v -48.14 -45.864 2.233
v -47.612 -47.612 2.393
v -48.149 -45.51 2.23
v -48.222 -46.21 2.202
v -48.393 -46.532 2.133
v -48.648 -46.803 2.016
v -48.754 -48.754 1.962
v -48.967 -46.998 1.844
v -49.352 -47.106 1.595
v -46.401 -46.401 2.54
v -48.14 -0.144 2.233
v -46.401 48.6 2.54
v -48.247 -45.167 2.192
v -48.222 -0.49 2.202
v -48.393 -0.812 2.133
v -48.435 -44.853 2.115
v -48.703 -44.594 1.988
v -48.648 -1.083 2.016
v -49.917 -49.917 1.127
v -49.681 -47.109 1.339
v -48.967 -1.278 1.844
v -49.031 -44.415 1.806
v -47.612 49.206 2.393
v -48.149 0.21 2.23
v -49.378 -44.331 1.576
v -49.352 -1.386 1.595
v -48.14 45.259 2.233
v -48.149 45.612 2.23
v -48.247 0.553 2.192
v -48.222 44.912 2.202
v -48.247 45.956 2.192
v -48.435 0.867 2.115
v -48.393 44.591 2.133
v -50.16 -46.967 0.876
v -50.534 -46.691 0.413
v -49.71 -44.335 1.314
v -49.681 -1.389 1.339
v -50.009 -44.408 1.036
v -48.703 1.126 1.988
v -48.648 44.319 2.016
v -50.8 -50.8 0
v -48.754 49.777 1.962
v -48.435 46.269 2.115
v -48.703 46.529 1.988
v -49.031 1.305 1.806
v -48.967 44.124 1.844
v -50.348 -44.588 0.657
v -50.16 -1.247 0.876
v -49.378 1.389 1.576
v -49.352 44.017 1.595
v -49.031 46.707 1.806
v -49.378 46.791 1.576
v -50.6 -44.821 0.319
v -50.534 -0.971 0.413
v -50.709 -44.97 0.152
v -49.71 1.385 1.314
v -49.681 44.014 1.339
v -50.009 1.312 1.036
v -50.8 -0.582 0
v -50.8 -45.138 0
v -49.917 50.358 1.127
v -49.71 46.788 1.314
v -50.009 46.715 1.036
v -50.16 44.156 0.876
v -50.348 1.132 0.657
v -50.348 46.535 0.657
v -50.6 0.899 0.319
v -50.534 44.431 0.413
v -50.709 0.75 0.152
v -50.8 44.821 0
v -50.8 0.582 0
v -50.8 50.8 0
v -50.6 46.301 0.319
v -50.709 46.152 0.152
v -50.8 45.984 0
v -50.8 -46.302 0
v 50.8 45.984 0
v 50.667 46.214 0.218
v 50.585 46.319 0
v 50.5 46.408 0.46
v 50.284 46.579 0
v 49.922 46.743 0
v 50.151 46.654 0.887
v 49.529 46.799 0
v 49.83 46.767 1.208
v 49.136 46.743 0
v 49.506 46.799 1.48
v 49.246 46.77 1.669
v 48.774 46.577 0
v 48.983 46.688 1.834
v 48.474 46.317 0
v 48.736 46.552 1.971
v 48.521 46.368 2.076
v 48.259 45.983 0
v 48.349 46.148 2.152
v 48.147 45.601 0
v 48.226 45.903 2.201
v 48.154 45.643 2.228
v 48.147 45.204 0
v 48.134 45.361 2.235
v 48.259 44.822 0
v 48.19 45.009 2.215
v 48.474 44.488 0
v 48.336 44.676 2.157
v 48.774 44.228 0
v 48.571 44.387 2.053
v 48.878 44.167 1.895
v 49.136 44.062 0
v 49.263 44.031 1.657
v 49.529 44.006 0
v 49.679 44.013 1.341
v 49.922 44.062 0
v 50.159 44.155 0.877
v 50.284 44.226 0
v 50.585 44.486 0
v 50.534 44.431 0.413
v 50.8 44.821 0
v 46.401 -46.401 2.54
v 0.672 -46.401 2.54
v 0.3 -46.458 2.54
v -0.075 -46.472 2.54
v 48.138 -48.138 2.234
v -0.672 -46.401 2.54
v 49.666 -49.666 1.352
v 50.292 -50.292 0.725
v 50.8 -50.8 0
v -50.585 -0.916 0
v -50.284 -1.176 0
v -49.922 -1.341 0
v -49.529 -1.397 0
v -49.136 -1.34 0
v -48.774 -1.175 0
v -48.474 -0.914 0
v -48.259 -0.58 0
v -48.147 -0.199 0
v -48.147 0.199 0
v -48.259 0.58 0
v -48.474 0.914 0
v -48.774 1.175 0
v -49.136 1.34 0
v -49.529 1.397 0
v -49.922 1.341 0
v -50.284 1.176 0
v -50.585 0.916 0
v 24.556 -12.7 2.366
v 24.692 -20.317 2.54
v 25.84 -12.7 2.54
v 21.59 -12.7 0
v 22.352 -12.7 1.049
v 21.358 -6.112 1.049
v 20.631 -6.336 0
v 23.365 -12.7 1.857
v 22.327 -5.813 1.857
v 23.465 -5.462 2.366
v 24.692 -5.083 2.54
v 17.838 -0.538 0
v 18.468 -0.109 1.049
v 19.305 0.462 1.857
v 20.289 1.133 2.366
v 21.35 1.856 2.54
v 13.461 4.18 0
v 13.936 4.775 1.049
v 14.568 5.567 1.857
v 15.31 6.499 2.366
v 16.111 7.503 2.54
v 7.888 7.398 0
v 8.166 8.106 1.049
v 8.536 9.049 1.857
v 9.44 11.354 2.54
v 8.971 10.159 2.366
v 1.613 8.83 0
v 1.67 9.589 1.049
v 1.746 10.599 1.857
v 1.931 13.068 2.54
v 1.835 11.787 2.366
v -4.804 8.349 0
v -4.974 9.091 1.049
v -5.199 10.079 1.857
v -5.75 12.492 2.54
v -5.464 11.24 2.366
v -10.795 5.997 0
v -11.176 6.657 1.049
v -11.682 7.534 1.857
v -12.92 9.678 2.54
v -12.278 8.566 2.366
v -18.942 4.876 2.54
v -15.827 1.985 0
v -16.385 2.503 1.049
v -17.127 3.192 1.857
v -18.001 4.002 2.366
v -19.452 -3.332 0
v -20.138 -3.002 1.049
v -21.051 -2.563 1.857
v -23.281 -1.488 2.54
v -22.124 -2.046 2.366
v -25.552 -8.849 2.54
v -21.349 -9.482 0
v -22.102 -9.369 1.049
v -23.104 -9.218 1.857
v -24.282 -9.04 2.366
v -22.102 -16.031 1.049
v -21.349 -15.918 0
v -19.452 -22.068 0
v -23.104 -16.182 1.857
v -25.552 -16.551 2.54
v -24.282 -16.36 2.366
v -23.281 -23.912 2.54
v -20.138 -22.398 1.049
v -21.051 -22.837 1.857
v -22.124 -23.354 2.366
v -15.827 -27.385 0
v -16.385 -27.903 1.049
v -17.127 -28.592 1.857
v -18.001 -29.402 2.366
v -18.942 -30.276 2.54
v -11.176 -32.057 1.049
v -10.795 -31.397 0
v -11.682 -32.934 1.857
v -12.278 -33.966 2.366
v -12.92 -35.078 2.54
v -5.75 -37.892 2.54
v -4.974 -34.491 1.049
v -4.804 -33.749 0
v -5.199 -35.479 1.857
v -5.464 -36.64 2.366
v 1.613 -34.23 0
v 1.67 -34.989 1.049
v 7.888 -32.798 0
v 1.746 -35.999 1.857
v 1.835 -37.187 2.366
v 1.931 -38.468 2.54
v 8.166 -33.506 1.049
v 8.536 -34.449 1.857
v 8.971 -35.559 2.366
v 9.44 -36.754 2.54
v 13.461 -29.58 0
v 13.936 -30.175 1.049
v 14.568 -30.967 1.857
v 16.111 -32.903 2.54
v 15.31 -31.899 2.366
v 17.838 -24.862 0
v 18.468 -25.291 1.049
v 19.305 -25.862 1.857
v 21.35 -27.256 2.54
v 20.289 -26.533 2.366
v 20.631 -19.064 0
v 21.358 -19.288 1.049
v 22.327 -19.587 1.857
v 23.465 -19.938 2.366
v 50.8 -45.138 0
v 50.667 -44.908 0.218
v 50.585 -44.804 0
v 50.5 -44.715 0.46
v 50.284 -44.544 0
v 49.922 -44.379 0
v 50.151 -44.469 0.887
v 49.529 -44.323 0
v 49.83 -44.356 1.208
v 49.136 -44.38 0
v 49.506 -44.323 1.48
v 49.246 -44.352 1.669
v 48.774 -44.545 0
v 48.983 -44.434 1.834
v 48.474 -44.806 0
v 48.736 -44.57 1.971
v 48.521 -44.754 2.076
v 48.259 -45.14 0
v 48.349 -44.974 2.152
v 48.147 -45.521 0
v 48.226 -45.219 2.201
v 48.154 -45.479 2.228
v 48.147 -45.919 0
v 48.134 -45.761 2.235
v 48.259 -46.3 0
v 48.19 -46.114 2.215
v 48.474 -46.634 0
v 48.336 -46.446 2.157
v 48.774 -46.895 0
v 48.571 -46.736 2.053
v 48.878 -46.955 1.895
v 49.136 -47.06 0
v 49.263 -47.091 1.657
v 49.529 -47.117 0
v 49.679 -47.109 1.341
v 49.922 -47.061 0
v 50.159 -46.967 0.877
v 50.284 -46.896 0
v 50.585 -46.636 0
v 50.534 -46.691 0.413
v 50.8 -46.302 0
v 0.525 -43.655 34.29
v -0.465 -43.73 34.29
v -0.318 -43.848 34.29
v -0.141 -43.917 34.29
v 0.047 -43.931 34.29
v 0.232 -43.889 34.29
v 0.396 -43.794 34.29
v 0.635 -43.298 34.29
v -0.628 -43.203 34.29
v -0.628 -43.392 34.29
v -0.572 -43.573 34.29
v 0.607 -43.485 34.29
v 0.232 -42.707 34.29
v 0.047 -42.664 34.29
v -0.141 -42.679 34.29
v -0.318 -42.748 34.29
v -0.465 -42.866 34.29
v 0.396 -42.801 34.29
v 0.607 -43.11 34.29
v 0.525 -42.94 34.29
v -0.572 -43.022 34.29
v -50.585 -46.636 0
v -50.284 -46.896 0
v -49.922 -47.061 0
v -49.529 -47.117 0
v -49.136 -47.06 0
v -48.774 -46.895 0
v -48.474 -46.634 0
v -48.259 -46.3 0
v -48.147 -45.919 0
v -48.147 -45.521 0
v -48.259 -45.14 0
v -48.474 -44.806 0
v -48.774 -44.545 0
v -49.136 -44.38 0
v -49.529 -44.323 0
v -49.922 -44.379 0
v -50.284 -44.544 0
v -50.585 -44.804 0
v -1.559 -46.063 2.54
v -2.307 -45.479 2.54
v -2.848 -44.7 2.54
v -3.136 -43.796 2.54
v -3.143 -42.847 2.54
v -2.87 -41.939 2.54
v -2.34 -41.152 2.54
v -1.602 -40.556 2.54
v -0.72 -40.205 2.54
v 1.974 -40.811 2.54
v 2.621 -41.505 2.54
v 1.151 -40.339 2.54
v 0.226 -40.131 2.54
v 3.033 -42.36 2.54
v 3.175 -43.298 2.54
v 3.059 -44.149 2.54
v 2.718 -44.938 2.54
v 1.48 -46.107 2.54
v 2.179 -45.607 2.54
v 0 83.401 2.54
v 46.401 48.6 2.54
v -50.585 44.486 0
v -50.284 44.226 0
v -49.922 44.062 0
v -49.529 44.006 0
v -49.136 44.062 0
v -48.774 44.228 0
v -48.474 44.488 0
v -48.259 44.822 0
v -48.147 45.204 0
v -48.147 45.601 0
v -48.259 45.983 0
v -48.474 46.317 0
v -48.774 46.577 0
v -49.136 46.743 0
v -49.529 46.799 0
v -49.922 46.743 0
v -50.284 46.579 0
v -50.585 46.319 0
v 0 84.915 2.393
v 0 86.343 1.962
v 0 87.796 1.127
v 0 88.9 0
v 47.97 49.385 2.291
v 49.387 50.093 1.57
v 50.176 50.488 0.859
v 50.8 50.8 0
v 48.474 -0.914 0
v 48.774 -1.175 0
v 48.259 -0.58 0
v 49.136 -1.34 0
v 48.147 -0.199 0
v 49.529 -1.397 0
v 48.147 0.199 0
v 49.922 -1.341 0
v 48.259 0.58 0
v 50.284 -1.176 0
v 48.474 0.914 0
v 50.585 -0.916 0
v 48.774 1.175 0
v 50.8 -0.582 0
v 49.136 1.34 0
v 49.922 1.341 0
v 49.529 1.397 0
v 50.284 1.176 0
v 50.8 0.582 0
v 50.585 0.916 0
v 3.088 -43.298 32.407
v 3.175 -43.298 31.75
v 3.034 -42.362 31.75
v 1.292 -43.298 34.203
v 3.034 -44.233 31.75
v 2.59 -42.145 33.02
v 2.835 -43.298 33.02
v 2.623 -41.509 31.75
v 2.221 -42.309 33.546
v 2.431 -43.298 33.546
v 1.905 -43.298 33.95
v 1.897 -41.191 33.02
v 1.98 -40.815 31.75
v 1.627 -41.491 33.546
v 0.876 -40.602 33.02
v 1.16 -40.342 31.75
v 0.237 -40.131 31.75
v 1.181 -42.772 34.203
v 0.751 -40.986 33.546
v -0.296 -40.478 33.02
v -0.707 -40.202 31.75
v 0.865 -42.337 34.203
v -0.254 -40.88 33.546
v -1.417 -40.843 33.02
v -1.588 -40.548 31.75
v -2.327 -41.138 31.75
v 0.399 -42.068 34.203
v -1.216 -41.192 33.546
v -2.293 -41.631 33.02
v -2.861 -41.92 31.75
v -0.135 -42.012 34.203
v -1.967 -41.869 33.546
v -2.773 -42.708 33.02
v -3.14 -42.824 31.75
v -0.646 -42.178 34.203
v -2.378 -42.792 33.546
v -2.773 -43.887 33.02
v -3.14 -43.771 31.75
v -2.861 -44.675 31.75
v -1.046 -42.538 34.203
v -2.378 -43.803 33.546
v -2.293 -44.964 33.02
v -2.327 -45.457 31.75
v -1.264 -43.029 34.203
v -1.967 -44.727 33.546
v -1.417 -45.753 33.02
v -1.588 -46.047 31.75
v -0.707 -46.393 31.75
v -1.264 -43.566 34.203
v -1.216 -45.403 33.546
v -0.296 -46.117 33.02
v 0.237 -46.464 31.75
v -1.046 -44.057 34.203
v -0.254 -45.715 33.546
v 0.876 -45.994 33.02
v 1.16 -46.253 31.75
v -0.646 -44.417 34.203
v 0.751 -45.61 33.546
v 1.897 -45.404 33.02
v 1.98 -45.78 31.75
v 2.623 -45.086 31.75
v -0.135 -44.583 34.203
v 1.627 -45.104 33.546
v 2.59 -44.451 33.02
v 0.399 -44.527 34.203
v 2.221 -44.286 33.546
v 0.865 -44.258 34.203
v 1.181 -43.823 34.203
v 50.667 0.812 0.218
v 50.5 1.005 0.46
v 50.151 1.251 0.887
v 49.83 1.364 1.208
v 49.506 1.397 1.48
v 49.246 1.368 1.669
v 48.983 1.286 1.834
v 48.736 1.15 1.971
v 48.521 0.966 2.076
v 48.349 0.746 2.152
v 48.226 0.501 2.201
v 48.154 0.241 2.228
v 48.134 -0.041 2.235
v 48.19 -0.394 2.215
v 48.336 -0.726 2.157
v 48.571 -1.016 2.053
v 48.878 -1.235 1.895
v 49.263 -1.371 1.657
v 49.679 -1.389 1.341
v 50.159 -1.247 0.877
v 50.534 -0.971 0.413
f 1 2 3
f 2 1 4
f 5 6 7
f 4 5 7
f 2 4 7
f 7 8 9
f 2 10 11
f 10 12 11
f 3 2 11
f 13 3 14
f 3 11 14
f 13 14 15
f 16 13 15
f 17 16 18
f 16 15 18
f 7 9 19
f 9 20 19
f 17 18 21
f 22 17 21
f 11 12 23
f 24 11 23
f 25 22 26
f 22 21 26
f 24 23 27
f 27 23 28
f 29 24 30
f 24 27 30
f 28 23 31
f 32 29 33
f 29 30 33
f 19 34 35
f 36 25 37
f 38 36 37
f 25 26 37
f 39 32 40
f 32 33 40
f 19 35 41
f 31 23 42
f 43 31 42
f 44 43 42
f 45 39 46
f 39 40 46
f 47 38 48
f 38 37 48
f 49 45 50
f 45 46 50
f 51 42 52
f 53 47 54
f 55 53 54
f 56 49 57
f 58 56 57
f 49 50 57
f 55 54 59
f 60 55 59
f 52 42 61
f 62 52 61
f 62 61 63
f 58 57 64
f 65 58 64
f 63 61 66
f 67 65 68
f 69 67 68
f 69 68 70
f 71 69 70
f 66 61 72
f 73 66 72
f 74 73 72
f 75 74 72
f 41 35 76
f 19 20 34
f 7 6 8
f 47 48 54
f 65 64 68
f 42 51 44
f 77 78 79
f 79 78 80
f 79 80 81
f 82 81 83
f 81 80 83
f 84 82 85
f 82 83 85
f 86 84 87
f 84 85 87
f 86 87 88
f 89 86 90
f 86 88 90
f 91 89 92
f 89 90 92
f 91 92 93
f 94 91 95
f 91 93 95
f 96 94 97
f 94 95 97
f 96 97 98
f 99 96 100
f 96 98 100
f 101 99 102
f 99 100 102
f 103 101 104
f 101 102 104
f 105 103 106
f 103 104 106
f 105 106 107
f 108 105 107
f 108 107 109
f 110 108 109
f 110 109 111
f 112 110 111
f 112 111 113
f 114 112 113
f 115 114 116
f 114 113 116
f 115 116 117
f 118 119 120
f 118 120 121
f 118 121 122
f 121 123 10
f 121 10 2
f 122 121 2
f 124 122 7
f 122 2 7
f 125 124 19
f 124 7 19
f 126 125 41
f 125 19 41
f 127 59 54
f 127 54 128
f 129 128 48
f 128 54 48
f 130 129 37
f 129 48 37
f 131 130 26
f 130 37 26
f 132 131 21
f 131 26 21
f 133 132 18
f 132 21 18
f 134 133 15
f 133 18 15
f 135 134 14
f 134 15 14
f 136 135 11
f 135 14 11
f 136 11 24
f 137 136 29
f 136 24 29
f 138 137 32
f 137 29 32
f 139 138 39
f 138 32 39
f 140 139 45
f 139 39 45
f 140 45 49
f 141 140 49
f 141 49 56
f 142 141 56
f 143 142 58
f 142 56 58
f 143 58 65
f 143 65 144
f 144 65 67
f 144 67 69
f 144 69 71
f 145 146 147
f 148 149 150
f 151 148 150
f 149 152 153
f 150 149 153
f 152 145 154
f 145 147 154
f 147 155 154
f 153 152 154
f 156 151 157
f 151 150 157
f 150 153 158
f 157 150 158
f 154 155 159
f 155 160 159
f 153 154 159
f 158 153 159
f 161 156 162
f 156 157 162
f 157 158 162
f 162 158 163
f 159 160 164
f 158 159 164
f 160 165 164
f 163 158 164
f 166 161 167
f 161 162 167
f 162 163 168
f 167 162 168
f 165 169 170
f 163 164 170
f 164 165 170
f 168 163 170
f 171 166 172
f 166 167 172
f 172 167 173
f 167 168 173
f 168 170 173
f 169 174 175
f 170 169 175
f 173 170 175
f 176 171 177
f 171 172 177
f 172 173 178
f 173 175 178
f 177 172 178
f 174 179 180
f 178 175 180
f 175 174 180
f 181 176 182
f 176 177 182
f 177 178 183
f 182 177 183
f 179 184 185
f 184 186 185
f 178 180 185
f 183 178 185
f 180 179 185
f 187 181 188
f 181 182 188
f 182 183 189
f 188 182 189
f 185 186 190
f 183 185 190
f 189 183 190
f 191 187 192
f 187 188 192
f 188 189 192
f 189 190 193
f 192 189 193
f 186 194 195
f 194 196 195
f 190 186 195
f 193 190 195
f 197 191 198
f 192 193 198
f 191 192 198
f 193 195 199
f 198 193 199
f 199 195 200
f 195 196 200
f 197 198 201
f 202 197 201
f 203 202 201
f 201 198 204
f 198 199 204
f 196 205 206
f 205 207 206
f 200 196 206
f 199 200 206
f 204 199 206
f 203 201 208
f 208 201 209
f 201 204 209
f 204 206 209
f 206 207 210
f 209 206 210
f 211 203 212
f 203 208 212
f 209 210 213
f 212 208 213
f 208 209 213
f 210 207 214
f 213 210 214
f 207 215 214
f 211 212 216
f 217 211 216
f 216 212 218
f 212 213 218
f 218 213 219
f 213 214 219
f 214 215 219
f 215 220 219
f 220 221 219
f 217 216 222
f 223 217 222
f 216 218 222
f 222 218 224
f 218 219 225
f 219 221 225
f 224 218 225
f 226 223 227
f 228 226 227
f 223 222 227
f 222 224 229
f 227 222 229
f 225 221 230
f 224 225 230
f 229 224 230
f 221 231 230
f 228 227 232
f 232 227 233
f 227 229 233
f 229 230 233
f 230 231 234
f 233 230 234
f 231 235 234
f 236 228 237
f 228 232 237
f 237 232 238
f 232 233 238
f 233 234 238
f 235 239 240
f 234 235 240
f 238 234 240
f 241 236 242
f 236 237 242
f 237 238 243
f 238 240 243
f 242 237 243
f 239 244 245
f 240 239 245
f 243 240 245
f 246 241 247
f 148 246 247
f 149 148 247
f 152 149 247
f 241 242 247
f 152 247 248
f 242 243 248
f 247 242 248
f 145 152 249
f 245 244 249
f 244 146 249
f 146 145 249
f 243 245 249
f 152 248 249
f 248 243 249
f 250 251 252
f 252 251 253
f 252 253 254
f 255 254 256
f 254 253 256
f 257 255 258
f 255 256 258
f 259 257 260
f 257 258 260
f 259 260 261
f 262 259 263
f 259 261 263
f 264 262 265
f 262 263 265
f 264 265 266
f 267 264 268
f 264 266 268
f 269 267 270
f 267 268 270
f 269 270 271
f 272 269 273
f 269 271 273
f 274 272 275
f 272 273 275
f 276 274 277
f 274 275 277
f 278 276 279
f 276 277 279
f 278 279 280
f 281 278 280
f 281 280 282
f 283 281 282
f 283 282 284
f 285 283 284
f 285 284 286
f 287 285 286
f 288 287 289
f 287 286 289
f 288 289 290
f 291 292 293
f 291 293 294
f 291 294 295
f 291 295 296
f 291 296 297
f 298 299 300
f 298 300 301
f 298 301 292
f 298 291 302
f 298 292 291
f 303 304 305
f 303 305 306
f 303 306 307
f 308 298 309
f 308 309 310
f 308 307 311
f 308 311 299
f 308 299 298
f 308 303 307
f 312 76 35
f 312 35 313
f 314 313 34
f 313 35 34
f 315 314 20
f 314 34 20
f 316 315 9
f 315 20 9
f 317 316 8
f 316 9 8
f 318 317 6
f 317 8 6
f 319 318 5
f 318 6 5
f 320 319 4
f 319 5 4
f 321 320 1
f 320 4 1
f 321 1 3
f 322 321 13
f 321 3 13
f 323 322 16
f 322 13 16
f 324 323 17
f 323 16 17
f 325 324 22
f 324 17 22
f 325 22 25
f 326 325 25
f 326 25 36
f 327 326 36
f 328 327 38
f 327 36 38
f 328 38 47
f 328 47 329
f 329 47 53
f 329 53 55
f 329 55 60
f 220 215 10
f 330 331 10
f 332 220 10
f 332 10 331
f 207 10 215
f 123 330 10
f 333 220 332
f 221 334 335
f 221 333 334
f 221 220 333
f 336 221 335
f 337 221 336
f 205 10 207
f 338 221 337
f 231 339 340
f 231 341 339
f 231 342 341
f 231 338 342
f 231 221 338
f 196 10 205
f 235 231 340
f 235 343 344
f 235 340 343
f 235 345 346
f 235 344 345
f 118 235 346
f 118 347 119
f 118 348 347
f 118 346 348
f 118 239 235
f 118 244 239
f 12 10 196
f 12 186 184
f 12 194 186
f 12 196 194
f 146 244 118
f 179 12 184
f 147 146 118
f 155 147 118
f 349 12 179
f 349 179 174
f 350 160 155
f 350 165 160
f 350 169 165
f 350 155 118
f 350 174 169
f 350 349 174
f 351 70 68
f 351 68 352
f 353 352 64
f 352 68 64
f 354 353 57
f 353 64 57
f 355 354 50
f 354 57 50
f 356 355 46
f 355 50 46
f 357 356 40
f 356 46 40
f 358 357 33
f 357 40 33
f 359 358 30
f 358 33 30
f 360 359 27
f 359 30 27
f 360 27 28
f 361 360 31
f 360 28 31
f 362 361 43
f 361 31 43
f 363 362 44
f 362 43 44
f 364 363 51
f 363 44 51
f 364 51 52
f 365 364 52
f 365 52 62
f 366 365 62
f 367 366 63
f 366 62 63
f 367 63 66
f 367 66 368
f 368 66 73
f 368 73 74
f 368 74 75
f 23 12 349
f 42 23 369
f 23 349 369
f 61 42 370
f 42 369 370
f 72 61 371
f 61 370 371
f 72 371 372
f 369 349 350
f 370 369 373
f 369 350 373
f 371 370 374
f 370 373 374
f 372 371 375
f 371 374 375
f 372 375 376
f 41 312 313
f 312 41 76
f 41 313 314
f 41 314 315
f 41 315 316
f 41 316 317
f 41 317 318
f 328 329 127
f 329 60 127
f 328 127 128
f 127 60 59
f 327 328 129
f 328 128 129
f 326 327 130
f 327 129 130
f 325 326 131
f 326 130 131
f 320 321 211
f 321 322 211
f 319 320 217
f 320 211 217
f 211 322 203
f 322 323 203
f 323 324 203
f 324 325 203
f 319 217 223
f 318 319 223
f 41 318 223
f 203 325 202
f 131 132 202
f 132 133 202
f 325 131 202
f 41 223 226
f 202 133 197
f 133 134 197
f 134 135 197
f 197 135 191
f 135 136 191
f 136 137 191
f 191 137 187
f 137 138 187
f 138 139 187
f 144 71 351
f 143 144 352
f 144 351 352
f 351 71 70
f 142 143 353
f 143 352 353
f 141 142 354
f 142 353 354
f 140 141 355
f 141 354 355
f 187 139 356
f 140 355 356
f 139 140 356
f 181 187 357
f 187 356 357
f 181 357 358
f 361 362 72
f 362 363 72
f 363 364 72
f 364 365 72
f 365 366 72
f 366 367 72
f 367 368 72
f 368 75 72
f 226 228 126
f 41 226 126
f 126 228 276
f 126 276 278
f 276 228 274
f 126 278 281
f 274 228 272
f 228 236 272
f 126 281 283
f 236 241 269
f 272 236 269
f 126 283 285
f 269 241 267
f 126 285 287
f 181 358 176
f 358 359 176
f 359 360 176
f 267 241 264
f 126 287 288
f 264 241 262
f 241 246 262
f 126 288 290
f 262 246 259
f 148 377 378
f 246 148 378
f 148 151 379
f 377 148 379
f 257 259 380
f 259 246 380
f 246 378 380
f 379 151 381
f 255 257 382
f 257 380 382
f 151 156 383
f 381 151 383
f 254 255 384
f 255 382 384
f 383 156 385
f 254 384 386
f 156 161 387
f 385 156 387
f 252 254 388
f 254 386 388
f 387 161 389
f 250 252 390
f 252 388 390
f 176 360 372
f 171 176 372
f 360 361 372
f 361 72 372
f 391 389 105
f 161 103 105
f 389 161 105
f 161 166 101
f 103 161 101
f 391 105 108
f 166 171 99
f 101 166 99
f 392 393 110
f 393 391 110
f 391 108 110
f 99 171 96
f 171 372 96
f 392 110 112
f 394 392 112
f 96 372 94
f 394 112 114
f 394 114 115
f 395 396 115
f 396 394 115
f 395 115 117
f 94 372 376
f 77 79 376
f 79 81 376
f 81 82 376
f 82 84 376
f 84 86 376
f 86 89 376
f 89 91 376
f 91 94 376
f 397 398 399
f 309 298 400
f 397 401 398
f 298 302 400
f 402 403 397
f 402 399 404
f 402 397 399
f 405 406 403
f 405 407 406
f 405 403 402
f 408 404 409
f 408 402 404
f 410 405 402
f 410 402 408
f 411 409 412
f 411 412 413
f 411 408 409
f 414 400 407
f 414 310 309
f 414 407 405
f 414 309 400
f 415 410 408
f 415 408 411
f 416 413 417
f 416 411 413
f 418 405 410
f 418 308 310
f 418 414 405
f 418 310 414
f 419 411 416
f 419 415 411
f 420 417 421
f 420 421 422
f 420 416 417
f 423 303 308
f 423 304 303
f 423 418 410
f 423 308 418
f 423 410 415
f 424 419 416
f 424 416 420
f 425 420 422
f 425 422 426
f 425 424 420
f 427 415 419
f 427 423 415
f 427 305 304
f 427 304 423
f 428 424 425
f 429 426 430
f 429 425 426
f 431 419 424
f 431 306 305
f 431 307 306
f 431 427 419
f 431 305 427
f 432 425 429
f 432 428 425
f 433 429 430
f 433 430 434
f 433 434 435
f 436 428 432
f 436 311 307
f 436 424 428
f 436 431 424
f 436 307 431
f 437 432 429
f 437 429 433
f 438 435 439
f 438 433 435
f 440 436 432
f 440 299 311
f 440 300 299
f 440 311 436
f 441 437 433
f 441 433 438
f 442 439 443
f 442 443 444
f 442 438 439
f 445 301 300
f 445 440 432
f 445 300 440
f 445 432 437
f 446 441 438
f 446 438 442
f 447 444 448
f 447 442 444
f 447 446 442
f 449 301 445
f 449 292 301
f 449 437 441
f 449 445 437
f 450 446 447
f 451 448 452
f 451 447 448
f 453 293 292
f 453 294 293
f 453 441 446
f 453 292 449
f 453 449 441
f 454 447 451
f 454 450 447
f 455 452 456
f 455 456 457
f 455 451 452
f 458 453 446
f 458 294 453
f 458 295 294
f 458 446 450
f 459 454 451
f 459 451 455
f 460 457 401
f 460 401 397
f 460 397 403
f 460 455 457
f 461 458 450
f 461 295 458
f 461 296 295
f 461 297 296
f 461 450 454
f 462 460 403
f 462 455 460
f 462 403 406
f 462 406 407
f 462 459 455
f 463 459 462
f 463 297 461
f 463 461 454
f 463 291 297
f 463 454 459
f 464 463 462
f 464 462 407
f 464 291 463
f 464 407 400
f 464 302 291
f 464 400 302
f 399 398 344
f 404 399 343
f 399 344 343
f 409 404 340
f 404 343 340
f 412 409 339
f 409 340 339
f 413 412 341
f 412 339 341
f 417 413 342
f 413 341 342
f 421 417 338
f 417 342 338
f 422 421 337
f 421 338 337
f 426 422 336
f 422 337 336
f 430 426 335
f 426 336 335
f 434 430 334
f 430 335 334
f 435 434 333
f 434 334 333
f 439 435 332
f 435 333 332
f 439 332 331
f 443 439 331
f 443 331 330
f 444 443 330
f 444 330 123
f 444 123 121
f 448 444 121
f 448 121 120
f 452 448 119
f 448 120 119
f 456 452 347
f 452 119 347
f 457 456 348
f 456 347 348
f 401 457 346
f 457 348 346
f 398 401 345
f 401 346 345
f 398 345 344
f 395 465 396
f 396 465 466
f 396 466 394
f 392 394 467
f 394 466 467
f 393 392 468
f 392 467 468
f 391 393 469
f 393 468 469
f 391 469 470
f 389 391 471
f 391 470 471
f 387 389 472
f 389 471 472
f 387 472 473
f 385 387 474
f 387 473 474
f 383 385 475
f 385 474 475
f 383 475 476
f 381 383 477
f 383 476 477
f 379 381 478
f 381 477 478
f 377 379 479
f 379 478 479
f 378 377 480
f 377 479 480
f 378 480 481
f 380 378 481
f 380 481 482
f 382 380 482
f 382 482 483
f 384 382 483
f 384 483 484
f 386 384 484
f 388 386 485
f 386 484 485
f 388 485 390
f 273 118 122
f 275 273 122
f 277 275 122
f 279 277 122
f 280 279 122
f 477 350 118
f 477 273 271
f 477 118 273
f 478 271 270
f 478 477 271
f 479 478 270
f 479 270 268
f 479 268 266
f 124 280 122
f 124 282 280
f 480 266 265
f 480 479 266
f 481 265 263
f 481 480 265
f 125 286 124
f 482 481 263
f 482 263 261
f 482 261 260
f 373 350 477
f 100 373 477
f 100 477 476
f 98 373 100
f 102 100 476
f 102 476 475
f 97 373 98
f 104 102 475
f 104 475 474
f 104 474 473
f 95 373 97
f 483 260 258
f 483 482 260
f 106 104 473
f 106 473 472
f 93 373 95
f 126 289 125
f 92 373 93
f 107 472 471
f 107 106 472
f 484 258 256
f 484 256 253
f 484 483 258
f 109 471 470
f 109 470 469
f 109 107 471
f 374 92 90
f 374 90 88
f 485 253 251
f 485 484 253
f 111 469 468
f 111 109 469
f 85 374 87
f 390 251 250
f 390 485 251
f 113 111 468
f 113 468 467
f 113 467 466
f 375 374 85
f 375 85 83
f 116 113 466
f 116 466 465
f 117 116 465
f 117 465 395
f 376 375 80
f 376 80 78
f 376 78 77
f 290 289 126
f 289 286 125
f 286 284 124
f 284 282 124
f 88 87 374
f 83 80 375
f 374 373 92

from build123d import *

# Parameters (mm, degrees)
F0_W         = 101.6
F0_H         = 101.6
F0_R         = 21.59
F1_DEPTH     = 2.54
F3_R         = 3.175
F4_DEPTH     = 31.75
F5_R         = 2.54
F6_T1_DEPTH  = 123.5970452561
F6_T3_DEPTH  = 85.4970452561
F6_T5_DEPTH  = 85.4970452561
F6_T10_DEPTH = 123.5970452561
F6_S11_R     = 3.175
F6_T12_DEPTH = 63
F8_D         = 2.794


# Not quite as in the source:
# - a fillet or chamfer that OpenCascade refuses, or shapes differently, is made with other operations: its cross-section is extruded or revolved along the edge and cut away or added


with BuildPart() as f1:
    # F0 (on Top) → F1 (new body)
    with BuildSketch(Plane.XY):
        Rectangle(F0_W, F0_H)
        with Locations((0, -12.7)):
            Circle(F0_R, mode=Mode.SUBTRACT)
        Polygon((-50.8, 50.8), (50.8, 50.8), (0, 88.9), align=None)
    extrude(amount=F1_DEPTH)

    # F2: fillet of radius 4.826 on 1 edges, made by hand

    # F2_s1 → F2_t2 (revolve, cut)
    with BuildSketch(Plane.XZ.offset(12.7)):
        with BuildLine():
            ThreePointArc((21.59, 0), (23.3645471712, 1.8566146333), (25.8402329348, 2.54))
            Line((25.8402329348, 2.54), (21.59, 2.54))
            Line((21.59, 2.54), (21.59, 0))
        make_face()
    revolve(axis=Axis((0, -12.7, 2.54), (0, 0, 1)), mode=Mode.SUBTRACT)

    # F3 (on face) → F4 (join)
    with BuildSketch(Plane.XY.offset(2.54)):
        with Locations((0, -43.2976202148)):
            Circle(F3_R)
    extrude(amount=F4_DEPTH)

    # F5
    f5_edges = [f1.edges().sort_by_distance(p)[0] for p in [
        (-3.175, -43.29762, 34.29),
    ]]
    fillet(f5_edges, radius=F5_R)

    # F6: fillet of radius 5.08 on 5 edges, made by hand

    # F6_s2 → F6_t1 (cut)
    with BuildSketch(Plane.XZ.offset(-61.7985226281)):
        with BuildLine():
            ThreePointArc((46.4005909488, 2.54), (48.9405909488, 1.8594090512), (50.8, 0))
            Line((50.8, 0), (50.8, 2.54))
            Line((50.8, 2.54), (46.4005909488, 2.54))
        make_face()
        with BuildLine():
            ThreePointArc((-46.4005909488, 2.54), (-48.9405909488, 1.8594090512), (-50.8, 0))
            Line((-50.8, 0), (-50.8, 2.54))
            Line((-50.8, 2.54), (-46.4005909488, 2.54))
        make_face()
    extrude(amount=F6_T1_DEPTH, mode=Mode.SUBTRACT)

    # F6_s4 → F6_t3 (cut)
    with BuildSketch(Plane(origin=(51.4708181025, 38.6031135768, 0), x_dir=(0, 0, 1), z_dir=(-0.8, -0.6, 0))):
        with BuildLine():
            ThreePointArc((2.54, 66.7205909488), (1.8594090512, 69.2605909488), (0, 71.12))
            Line((0, 71.12), (2.54, 71.12))
            Line((2.54, 71.12), (2.54, 66.7205909488))
        make_face()
    extrude(amount=F6_T3_DEPTH, mode=Mode.SUBTRACT)

    # F6_s6 → F6_t5 (cut)
    with BuildSketch(Plane(origin=(16.9268181025, -12.6951135768, 0), x_dir=(0, 0, 1), z_dir=(-0.8, 0.6, 0))):
        with BuildLine():
            ThreePointArc((2.54, 66.7205909488), (1.8594090512, 69.2605909488), (0, 71.12))
            Line((0, 71.12), (2.54, 71.12))
            Line((2.54, 71.12), (2.54, 66.7205909488))
        make_face()
    extrude(amount=F6_T5_DEPTH, mode=Mode.SUBTRACT)


with BuildPart() as f6_tool8:
    # F6_s9 → F6_t10 (new body)
    with BuildSketch(Plane.YZ.offset(-61.7985226281)):
        with BuildLine():
            ThreePointArc((-46.4005909488, 2.54), (-48.9405909488, 1.8594090512), (-50.8, 0))
            Line((-50.8, 0), (-50.8, 2.54))
            Line((-50.8, 2.54), (-46.4005909488, 2.54))
        make_face()
    extrude(amount=F6_T10_DEPTH)

    # F6_s11 → F6_t12 (cut, symmetric)
    with BuildSketch(Plane.XY.offset(1.3)):
        with Locations((0, -43.2976202148)):
            Circle(F6_S11_R)
    extrude(amount=F6_T12_DEPTH, both=True, mode=Mode.SUBTRACT)


with BuildPart() as f1_1:
    add(f1.part)

    # F6_t7: cut F6_tool8
    add(f6_tool8.part, mode=Mode.SUBTRACT)

    # F8 (through all)
    with Locations(Plane(origin=(0, 0, 0), x_dir=(1, 0, 0), z_dir=(0, 0, -1))):
        with Locations((-49.53, -45.4025), (-49.53, 0), (-49.53, 45.72), (49.53, 45.72), (49.53, 0), (49.53, -45.4025)):
            Hole(F8_D / 2)


solid = f1_1.part
